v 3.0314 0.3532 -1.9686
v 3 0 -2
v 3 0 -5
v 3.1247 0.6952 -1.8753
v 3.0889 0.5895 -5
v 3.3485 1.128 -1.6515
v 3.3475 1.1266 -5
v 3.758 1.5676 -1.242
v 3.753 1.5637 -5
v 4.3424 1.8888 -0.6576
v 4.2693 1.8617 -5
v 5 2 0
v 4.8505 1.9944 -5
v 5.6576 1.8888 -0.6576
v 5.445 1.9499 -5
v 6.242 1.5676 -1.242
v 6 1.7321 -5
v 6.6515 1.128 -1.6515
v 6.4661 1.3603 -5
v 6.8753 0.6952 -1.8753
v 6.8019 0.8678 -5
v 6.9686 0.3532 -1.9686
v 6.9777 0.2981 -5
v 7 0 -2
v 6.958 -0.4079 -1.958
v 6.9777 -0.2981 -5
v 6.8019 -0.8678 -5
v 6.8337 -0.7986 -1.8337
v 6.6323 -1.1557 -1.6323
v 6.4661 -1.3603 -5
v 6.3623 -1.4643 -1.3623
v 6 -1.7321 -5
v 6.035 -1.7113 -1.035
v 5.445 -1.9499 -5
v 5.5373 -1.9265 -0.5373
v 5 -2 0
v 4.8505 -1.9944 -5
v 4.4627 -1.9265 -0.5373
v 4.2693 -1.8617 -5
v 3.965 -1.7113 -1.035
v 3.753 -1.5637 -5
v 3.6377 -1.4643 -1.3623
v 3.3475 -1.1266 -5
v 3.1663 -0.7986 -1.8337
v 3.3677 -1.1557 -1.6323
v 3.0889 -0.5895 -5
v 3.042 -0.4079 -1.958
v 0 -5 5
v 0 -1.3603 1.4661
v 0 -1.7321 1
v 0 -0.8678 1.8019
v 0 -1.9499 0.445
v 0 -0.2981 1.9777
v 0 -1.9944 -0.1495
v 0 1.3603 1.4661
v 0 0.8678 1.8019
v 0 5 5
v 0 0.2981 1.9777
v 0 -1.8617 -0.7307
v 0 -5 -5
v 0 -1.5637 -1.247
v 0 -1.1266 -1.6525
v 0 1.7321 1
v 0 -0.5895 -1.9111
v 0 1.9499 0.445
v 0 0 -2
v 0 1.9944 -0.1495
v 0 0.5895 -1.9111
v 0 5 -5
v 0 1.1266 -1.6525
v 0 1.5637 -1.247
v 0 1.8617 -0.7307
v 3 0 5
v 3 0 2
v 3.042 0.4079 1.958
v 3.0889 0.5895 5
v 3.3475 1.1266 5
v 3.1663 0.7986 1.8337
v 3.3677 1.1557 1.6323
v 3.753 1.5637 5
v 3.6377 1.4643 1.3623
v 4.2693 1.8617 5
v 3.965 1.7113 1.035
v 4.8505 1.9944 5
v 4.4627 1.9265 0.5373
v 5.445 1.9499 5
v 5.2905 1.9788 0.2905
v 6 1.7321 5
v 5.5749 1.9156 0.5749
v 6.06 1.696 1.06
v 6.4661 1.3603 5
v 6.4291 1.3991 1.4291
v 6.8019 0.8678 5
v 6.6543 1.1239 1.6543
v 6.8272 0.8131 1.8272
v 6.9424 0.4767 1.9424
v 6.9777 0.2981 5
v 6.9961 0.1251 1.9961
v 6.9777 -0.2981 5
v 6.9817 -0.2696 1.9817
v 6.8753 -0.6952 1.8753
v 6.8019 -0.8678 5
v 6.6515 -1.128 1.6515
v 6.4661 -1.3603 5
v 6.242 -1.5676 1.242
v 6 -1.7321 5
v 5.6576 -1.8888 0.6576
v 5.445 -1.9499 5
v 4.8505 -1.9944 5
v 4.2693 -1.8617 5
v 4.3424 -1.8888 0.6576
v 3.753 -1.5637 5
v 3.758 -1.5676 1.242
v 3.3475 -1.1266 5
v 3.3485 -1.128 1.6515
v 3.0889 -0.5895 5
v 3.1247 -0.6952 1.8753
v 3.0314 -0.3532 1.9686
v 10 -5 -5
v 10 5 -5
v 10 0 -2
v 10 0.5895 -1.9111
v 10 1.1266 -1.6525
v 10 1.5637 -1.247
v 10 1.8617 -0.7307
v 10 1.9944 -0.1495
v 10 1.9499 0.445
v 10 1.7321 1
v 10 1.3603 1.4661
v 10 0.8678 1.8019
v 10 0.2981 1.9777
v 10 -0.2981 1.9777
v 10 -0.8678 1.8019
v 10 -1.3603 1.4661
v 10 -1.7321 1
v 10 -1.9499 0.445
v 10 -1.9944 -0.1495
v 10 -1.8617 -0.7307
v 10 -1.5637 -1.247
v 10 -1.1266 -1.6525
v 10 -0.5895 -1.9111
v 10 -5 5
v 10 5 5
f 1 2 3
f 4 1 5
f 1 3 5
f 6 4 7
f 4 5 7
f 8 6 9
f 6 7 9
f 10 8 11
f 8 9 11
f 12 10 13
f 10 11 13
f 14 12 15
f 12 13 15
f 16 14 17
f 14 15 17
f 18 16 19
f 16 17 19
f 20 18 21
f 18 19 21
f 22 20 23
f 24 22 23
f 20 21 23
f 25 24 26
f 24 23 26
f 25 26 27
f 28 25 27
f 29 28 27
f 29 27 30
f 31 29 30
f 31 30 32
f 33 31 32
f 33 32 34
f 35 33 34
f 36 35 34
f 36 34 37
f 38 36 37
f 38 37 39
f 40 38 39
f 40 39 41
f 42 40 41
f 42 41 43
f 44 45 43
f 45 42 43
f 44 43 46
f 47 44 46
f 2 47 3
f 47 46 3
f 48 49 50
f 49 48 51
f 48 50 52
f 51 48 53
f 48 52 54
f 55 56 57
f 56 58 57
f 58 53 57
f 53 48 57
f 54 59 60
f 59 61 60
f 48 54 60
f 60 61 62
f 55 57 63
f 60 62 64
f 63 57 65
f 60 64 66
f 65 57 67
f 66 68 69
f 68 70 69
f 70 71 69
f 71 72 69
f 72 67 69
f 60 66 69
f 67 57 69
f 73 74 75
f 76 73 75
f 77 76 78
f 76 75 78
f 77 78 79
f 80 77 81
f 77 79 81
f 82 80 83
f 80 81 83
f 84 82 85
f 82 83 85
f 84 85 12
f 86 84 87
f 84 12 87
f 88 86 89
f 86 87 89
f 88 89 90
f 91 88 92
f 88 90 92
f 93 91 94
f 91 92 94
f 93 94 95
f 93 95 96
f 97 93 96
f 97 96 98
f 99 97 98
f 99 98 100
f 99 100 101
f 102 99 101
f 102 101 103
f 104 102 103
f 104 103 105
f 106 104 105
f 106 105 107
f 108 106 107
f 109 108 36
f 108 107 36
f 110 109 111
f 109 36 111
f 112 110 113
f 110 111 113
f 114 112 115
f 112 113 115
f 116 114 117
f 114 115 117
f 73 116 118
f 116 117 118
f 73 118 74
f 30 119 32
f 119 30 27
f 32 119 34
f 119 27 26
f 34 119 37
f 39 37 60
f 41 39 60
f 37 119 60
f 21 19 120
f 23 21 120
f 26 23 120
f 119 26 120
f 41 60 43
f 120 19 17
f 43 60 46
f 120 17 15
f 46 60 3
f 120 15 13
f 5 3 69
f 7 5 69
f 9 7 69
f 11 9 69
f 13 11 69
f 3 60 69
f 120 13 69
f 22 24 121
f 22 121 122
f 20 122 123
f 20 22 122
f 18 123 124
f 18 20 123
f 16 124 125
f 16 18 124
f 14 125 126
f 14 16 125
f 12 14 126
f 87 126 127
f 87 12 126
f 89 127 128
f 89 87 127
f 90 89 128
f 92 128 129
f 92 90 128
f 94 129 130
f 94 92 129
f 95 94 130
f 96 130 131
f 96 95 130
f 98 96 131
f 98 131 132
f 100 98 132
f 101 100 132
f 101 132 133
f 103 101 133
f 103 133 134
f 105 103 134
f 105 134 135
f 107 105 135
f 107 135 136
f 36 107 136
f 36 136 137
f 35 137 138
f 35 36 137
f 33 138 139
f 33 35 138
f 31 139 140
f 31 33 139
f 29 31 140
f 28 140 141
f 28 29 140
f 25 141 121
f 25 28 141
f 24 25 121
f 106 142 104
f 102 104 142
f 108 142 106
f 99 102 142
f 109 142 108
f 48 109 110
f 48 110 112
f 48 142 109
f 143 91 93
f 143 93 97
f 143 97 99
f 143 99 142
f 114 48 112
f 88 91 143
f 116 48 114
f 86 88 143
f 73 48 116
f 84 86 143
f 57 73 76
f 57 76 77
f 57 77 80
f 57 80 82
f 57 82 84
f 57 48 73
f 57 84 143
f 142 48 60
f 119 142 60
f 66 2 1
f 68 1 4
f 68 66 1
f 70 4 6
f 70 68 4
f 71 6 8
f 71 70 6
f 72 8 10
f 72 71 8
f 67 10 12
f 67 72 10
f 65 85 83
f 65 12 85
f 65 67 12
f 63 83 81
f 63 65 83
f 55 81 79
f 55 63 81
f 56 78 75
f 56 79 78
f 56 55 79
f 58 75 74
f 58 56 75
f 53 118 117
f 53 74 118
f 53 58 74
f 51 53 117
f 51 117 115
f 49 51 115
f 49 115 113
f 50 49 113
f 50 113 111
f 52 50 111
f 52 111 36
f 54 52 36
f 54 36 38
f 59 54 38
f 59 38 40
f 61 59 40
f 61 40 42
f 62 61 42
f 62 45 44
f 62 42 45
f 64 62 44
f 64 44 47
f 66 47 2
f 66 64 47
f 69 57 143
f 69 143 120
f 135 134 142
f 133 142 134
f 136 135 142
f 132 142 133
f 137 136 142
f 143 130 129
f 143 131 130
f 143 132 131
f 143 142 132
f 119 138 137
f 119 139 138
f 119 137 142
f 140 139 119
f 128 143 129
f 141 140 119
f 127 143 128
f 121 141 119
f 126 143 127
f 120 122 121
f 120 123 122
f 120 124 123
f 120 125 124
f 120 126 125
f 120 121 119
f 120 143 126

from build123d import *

# Parameters (mm, degrees)
SKETCH_1_W          = 10
SKETCH_1_H          = 10
SKETCH_1_R          = 2
EXTRUDE_1_DEPTH     = 10
SKETCH_2_R          = 2
CUT_EXTRUDE_1_DEPTH = 16


with BuildPart() as part:
    # 草图1 → 凸台-拉伸1 (new body)
    with BuildSketch(Plane(origin=(0, 0, 0), x_dir=(0, 0, -1), z_dir=(1, 0, 0))):
        Rectangle(SKETCH_1_W, SKETCH_1_H)
        Circle(SKETCH_1_R, mode=Mode.SUBTRACT)
    extrude(amount=EXTRUDE_1_DEPTH)

    # 草图2 → 切除-拉伸1 (cut, through all)
    with BuildSketch(Plane(origin=(0, 0, -5), x_dir=(-1, 0, 0), z_dir=(0, 0, -1))):
        with Locations((-5, 0)):
            Circle(SKETCH_2_R)
    extrude(amount=-CUT_EXTRUDE_1_DEPTH, mode=Mode.SUBTRACT)


solid = part.part
